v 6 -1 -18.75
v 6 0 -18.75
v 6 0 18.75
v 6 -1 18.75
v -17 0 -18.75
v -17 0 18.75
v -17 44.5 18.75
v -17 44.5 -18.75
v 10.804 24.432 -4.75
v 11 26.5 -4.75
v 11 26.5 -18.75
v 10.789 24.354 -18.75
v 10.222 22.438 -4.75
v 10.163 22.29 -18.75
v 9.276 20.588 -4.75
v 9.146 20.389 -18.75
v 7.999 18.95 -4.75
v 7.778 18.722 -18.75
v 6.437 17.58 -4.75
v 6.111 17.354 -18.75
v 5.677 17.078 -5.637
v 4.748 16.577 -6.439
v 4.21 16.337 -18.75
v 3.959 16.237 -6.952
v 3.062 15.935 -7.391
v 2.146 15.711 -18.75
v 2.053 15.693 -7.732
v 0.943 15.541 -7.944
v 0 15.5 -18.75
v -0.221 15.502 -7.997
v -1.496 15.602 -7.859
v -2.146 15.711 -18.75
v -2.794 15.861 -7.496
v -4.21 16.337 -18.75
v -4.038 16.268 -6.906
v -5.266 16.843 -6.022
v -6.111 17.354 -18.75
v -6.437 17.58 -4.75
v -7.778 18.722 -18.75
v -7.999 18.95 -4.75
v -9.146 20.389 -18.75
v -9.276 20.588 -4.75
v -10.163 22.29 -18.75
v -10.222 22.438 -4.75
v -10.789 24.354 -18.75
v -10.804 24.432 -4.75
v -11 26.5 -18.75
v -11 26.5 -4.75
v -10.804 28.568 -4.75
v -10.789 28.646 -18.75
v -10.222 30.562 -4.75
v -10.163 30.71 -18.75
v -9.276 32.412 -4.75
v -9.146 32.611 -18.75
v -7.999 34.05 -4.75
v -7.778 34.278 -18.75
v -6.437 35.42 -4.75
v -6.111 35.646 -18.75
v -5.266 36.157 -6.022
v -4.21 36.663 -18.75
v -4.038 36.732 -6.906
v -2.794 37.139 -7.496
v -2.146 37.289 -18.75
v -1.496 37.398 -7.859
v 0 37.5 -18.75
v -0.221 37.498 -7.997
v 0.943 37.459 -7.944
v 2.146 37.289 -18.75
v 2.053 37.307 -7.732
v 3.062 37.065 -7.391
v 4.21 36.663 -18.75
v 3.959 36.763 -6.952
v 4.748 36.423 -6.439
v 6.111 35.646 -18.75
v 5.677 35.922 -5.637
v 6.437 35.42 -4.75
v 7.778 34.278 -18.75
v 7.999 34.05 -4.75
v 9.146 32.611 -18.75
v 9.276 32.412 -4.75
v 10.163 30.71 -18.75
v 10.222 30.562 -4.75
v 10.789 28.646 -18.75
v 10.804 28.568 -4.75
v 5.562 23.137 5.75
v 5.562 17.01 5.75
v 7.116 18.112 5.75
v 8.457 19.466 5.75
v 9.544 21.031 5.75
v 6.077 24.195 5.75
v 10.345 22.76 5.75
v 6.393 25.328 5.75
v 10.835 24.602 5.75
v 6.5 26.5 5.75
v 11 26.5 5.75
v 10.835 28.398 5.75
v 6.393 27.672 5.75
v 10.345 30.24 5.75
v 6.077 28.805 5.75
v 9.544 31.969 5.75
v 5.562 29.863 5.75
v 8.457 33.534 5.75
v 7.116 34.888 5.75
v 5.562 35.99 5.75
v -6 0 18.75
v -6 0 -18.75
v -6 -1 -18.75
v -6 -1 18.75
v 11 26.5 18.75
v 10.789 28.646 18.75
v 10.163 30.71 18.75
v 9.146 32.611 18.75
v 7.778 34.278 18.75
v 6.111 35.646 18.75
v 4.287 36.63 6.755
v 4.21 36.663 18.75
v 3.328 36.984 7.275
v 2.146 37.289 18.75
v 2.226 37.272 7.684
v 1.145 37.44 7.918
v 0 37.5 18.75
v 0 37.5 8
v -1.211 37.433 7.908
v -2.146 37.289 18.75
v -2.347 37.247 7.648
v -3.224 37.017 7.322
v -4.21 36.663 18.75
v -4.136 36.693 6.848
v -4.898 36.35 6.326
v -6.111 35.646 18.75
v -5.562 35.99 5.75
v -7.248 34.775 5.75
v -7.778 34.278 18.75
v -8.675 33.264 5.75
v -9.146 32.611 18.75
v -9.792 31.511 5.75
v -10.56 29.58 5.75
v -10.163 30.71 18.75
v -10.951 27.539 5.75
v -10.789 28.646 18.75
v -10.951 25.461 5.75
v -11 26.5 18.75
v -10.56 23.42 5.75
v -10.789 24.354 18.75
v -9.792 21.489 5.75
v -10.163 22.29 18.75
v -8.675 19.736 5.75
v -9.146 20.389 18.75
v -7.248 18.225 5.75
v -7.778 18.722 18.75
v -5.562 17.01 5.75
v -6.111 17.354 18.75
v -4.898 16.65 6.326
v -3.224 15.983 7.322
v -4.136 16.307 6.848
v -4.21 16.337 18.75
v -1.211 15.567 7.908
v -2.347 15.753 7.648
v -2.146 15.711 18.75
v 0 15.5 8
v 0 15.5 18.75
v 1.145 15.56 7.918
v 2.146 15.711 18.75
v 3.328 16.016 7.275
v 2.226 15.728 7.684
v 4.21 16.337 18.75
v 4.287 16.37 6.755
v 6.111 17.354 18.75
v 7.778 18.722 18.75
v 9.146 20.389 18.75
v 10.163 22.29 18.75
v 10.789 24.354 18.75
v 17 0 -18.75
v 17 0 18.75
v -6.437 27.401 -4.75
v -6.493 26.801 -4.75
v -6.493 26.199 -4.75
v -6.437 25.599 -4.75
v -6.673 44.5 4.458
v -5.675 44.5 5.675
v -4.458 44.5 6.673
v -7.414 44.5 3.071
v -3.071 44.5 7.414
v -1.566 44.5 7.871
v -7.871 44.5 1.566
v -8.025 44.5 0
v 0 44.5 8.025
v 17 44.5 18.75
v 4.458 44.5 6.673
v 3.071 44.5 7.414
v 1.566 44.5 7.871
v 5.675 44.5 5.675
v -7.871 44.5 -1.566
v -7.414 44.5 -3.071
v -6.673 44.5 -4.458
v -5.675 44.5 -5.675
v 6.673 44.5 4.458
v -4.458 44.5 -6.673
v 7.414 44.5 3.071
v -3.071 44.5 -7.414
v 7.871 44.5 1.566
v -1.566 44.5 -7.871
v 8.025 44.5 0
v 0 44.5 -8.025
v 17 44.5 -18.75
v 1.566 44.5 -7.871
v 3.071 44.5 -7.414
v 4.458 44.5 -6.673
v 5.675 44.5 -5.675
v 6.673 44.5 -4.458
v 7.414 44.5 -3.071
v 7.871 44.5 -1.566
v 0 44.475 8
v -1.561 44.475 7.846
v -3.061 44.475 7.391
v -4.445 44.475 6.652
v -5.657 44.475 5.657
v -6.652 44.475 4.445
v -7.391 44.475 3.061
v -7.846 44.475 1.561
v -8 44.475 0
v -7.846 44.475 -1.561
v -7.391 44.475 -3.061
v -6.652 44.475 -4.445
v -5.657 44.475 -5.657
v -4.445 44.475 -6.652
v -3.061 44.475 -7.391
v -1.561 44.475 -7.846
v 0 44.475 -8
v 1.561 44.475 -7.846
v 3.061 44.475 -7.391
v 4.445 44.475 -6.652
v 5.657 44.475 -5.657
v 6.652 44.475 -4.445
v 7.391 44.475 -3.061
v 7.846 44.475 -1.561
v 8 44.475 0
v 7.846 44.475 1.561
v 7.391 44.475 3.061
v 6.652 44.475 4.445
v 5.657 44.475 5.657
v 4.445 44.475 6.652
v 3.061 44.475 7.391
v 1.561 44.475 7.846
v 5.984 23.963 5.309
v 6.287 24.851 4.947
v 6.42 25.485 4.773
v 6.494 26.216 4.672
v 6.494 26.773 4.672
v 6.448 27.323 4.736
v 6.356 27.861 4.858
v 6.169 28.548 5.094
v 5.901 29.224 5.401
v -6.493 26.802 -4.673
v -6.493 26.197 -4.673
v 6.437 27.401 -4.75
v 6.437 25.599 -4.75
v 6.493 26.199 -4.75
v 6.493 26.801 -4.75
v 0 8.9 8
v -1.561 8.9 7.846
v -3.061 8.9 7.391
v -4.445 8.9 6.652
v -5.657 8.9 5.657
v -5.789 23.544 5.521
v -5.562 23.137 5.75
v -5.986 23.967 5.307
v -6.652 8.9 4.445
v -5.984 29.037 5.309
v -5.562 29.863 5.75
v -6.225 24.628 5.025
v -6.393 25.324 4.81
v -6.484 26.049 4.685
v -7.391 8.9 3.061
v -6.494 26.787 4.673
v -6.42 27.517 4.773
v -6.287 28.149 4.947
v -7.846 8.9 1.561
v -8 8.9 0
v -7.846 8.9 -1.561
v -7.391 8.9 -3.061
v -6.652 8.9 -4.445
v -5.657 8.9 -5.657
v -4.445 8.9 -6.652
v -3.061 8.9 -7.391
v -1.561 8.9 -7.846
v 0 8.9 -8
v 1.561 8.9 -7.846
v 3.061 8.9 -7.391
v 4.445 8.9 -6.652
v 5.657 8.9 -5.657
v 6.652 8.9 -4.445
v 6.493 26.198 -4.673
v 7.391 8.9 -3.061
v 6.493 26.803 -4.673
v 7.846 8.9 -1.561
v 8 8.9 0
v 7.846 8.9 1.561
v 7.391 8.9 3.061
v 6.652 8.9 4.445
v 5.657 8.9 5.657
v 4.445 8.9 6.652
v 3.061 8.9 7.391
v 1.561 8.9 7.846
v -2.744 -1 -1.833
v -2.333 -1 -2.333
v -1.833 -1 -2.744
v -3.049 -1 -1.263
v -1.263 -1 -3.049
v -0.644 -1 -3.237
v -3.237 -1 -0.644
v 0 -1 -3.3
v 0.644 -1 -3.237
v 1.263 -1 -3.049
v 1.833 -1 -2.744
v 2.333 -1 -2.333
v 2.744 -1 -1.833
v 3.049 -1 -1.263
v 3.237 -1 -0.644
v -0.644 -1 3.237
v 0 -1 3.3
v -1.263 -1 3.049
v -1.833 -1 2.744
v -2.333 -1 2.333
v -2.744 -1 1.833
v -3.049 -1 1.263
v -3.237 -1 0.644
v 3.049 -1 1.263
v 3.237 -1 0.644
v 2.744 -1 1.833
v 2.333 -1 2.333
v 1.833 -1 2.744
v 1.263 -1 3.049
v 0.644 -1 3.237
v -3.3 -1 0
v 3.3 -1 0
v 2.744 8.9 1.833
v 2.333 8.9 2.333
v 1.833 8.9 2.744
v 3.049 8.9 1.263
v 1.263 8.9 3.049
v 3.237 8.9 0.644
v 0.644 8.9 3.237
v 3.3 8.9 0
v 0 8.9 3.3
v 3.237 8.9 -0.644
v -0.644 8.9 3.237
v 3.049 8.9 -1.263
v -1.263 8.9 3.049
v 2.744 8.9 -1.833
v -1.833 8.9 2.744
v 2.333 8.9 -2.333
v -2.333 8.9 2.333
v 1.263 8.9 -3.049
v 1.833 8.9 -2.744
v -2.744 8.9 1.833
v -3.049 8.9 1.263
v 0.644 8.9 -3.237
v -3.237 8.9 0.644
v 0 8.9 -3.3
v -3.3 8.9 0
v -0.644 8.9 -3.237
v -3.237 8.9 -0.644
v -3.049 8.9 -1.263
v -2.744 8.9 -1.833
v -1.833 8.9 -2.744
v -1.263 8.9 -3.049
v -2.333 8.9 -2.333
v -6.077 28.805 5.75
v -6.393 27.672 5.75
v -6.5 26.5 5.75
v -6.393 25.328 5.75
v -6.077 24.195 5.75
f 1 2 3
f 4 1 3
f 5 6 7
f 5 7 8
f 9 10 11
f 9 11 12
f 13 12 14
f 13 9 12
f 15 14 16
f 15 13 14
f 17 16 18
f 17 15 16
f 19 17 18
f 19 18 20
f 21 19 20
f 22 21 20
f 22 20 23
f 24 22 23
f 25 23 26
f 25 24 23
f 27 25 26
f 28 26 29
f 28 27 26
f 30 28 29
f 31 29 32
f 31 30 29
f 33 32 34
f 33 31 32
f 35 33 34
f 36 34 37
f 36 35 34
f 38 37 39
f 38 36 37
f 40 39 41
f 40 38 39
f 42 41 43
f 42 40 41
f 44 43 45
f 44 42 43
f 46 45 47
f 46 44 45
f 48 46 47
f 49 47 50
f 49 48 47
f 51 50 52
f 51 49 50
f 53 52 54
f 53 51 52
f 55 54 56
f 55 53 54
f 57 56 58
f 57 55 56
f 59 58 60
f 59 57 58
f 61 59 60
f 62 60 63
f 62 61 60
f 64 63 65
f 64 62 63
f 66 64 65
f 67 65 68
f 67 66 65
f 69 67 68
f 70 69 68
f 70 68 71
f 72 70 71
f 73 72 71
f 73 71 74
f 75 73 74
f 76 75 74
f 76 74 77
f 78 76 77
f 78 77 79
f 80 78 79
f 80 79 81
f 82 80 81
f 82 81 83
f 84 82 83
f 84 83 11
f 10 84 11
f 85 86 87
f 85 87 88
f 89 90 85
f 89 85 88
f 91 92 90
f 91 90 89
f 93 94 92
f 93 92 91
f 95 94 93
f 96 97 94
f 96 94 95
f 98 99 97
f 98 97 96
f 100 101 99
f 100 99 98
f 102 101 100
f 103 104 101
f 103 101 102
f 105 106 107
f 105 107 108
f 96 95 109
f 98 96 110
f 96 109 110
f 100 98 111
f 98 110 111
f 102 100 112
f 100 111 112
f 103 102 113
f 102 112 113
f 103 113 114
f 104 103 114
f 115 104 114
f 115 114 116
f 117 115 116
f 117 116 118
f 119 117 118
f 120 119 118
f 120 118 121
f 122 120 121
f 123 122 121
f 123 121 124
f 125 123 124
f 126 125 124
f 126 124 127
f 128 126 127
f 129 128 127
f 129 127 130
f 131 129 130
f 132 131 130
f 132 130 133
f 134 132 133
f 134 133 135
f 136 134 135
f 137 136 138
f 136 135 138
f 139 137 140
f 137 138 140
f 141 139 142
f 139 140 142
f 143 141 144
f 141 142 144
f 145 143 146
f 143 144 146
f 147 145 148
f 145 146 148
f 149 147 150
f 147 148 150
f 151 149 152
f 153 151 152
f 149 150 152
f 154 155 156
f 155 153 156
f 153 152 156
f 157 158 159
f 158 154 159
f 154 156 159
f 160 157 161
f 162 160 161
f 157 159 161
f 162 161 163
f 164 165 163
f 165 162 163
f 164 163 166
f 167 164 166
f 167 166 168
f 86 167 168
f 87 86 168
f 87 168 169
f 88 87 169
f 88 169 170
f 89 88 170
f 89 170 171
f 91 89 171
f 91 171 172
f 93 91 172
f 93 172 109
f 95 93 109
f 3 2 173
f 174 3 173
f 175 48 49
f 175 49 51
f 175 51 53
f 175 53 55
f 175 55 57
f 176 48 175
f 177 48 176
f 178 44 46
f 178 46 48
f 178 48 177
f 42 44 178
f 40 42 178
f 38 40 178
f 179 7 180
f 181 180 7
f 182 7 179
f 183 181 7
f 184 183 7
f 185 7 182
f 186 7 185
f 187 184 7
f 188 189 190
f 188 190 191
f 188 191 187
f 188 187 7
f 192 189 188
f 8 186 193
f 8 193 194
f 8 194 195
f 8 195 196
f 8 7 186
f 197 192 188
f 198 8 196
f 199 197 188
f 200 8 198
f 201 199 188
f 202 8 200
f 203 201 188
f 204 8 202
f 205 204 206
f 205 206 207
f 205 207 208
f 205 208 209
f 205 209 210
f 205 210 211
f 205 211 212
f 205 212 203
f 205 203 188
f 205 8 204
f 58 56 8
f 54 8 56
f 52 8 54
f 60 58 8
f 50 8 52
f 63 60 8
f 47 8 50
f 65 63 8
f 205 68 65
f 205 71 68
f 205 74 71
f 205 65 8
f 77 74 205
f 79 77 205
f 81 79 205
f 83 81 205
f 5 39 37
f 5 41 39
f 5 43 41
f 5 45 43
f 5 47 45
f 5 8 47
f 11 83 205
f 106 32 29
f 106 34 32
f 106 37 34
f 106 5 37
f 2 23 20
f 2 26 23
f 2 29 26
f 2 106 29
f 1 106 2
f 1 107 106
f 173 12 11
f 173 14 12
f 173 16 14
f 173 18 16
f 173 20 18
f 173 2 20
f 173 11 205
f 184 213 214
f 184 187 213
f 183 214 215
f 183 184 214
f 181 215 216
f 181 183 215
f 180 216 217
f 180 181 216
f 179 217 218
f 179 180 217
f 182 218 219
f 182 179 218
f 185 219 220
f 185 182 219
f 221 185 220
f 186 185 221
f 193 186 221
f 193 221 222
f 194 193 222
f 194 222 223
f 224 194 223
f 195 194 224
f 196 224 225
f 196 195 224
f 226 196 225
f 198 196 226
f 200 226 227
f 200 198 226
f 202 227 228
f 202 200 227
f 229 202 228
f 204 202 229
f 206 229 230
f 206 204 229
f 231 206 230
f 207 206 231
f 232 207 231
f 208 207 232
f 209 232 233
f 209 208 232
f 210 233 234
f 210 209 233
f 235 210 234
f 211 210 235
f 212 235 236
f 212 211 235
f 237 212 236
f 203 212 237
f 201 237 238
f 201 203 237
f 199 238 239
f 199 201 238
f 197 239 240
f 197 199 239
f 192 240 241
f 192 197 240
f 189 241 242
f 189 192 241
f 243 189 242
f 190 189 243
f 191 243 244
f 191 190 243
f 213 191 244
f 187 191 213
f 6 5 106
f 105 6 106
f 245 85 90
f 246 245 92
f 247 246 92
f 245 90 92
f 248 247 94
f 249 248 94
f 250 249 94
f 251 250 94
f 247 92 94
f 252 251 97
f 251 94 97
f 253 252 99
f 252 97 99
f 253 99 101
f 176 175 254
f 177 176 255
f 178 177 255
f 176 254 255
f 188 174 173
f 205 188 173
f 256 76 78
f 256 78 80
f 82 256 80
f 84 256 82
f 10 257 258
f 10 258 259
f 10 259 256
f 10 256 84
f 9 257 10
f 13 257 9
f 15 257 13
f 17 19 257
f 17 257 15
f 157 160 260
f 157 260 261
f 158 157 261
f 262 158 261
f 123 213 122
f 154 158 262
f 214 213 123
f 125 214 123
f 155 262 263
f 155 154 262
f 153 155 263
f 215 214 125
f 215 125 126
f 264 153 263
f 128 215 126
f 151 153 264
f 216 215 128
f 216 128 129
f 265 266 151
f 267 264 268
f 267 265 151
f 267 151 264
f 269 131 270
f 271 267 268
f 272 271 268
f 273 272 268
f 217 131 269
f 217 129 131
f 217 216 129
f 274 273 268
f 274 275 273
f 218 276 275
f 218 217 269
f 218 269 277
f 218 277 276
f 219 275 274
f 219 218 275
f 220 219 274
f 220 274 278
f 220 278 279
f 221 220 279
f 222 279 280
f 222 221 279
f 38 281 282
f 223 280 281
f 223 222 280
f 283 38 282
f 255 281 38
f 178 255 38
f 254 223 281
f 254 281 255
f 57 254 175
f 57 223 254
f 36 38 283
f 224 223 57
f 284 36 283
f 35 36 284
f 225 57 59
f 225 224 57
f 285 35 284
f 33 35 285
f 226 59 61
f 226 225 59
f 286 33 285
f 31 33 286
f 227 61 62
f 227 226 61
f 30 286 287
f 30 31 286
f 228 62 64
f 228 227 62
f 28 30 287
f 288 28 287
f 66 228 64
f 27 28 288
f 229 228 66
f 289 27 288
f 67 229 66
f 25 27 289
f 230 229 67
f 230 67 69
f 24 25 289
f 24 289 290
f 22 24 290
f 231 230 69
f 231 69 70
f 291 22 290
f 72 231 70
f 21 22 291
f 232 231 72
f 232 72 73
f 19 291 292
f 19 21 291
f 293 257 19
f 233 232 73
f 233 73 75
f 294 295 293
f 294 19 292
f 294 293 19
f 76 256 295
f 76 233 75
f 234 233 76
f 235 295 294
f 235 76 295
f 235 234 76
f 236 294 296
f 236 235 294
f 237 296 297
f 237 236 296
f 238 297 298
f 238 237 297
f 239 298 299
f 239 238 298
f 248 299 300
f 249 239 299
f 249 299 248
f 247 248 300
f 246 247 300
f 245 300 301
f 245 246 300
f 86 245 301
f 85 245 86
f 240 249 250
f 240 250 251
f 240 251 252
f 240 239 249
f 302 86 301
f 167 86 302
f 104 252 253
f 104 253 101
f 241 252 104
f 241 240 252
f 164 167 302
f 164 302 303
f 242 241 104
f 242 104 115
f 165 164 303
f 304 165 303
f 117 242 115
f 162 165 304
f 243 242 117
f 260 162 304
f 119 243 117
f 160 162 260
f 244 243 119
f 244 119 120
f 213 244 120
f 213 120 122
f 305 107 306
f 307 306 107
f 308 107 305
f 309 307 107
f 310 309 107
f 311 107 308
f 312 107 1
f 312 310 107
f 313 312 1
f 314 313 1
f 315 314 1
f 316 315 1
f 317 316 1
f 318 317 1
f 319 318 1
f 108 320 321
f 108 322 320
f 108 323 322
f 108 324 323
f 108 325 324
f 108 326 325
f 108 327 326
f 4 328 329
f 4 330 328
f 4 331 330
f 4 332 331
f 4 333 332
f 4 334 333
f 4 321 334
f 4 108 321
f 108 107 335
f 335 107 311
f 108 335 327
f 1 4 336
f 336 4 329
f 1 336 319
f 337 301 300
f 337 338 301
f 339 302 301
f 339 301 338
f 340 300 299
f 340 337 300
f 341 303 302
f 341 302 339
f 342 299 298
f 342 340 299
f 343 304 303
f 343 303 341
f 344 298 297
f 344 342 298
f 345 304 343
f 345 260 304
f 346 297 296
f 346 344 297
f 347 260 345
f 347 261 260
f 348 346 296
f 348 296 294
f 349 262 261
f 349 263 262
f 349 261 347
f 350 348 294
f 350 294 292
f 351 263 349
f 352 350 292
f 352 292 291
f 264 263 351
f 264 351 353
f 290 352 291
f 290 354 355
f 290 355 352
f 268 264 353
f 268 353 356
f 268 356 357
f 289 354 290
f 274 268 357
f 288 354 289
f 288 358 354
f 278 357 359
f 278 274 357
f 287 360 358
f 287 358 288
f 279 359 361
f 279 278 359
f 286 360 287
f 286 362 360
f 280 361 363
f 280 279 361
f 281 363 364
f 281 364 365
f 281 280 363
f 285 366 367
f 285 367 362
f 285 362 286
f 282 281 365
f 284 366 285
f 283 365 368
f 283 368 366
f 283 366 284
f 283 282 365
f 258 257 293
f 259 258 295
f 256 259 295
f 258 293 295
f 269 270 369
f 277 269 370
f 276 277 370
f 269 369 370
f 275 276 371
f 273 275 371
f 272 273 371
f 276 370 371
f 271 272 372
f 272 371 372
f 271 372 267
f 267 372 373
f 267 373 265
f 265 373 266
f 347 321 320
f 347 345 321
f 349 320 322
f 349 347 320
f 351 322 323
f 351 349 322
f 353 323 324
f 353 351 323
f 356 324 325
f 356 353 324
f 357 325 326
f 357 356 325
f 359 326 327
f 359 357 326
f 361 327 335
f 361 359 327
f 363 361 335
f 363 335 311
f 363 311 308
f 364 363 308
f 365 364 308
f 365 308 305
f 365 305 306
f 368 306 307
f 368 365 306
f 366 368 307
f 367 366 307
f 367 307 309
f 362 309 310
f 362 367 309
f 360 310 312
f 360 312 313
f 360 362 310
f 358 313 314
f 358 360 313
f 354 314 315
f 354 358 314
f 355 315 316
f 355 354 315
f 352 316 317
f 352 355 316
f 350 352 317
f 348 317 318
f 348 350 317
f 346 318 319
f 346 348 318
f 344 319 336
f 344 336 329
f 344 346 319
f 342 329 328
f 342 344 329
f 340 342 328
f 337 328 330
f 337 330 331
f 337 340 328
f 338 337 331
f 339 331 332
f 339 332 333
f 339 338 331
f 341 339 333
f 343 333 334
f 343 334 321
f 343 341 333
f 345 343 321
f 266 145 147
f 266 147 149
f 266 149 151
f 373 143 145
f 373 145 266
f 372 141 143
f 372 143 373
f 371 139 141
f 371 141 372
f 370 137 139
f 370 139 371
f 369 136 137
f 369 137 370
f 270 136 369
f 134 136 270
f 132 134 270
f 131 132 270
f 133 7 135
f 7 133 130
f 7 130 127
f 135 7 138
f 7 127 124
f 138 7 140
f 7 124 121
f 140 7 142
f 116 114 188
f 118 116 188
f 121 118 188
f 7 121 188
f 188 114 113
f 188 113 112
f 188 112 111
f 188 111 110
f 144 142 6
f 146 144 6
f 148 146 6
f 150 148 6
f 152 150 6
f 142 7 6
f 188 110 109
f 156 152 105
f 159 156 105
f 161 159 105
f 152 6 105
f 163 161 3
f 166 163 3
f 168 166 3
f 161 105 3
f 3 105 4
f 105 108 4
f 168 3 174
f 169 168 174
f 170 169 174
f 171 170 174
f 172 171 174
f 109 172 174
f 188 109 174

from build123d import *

# Parameters (mm, degrees)
SKETCH_1_W             = 34
SKETCH_1_H             = 37.5
EXTRUDE_282_DEPTH      = 44.5
SKETCH_2_W             = 12
SKETCH_2_H             = 37.5
EXTRUDE_458_DEPTH      = 1
SKETCH_3_R             = 6.5
CUT_EXTRUDE_1_DEPTH    = 61.625902055
SKETCH_4_R             = 11
CUT_EXTRUDE_843_DEPTH  = 13
CUT_EXTRUDE_START      = -14
SKETCH_5_R             = 11
CUT_EXTRUDE_1029_DEPTH = 14


with BuildPart() as part:
    # Эскиз1 → Extrude 282 (new body)
    with BuildSketch(Plane(origin=(0, 0, 0), x_dir=(1, 0, 0), z_dir=(0, 1, 0))):
        Rectangle(SKETCH_1_W, SKETCH_1_H)
    extrude(amount=EXTRUDE_282_DEPTH)

    # Эскиз2 → Extrude 458 (add)
    with BuildSketch(Plane.XZ):
        Rectangle(SKETCH_2_W, SKETCH_2_H)
    extrude(amount=EXTRUDE_458_DEPTH)

    # Эскиз3 → Вырез-Вытянуть1 (cut, through all)
    with BuildSketch(Plane.XY.offset(18.75)):
        with Locations((0, 26.5)):
            Circle(SKETCH_3_R)
    extrude(amount=-CUT_EXTRUDE_1_DEPTH, mode=Mode.SUBTRACT)

    # Эскиз4 → Cut-Extrude 843 (cut)
    with BuildSketch(Plane.XY.offset(18.75)):
        with Locations((0, 26.5)):
            Circle(SKETCH_4_R)
    extrude(amount=-CUT_EXTRUDE_843_DEPTH, mode=Mode.SUBTRACT)

    # Эскиз5 → Cut-Extrude 1029 (cut)
    with BuildSketch(Plane(origin=(0, 0, -18.75), x_dir=(-1, 0, 0), z_dir=(0, 0, -1)).offset(CUT_EXTRUDE_START)):
        with Locations(Location((0, 26.5, 0), (0, 0, 180))):
            Circle(SKETCH_5_R)
    extrude(amount=CUT_EXTRUDE_1029_DEPTH, mode=Mode.SUBTRACT)

    # Эскиз7 → К профилю M6 (revolve, cut)
    with BuildSketch(Plane(origin=(0, 44.5, 0), x_dir=(0, 0, 1), z_dir=(1, 0, 0))):
        Polygon((0, 0), (0, 45.5), (3.3, 45.5), (3.3, 35.6), (8, 35.6), (8, 0.025), (8.025, 0), align=None)
    revolve(axis=Axis((0, 50.85, 0), (0, -1, 0)), mode=Mode.SUBTRACT)


solid = part.part
